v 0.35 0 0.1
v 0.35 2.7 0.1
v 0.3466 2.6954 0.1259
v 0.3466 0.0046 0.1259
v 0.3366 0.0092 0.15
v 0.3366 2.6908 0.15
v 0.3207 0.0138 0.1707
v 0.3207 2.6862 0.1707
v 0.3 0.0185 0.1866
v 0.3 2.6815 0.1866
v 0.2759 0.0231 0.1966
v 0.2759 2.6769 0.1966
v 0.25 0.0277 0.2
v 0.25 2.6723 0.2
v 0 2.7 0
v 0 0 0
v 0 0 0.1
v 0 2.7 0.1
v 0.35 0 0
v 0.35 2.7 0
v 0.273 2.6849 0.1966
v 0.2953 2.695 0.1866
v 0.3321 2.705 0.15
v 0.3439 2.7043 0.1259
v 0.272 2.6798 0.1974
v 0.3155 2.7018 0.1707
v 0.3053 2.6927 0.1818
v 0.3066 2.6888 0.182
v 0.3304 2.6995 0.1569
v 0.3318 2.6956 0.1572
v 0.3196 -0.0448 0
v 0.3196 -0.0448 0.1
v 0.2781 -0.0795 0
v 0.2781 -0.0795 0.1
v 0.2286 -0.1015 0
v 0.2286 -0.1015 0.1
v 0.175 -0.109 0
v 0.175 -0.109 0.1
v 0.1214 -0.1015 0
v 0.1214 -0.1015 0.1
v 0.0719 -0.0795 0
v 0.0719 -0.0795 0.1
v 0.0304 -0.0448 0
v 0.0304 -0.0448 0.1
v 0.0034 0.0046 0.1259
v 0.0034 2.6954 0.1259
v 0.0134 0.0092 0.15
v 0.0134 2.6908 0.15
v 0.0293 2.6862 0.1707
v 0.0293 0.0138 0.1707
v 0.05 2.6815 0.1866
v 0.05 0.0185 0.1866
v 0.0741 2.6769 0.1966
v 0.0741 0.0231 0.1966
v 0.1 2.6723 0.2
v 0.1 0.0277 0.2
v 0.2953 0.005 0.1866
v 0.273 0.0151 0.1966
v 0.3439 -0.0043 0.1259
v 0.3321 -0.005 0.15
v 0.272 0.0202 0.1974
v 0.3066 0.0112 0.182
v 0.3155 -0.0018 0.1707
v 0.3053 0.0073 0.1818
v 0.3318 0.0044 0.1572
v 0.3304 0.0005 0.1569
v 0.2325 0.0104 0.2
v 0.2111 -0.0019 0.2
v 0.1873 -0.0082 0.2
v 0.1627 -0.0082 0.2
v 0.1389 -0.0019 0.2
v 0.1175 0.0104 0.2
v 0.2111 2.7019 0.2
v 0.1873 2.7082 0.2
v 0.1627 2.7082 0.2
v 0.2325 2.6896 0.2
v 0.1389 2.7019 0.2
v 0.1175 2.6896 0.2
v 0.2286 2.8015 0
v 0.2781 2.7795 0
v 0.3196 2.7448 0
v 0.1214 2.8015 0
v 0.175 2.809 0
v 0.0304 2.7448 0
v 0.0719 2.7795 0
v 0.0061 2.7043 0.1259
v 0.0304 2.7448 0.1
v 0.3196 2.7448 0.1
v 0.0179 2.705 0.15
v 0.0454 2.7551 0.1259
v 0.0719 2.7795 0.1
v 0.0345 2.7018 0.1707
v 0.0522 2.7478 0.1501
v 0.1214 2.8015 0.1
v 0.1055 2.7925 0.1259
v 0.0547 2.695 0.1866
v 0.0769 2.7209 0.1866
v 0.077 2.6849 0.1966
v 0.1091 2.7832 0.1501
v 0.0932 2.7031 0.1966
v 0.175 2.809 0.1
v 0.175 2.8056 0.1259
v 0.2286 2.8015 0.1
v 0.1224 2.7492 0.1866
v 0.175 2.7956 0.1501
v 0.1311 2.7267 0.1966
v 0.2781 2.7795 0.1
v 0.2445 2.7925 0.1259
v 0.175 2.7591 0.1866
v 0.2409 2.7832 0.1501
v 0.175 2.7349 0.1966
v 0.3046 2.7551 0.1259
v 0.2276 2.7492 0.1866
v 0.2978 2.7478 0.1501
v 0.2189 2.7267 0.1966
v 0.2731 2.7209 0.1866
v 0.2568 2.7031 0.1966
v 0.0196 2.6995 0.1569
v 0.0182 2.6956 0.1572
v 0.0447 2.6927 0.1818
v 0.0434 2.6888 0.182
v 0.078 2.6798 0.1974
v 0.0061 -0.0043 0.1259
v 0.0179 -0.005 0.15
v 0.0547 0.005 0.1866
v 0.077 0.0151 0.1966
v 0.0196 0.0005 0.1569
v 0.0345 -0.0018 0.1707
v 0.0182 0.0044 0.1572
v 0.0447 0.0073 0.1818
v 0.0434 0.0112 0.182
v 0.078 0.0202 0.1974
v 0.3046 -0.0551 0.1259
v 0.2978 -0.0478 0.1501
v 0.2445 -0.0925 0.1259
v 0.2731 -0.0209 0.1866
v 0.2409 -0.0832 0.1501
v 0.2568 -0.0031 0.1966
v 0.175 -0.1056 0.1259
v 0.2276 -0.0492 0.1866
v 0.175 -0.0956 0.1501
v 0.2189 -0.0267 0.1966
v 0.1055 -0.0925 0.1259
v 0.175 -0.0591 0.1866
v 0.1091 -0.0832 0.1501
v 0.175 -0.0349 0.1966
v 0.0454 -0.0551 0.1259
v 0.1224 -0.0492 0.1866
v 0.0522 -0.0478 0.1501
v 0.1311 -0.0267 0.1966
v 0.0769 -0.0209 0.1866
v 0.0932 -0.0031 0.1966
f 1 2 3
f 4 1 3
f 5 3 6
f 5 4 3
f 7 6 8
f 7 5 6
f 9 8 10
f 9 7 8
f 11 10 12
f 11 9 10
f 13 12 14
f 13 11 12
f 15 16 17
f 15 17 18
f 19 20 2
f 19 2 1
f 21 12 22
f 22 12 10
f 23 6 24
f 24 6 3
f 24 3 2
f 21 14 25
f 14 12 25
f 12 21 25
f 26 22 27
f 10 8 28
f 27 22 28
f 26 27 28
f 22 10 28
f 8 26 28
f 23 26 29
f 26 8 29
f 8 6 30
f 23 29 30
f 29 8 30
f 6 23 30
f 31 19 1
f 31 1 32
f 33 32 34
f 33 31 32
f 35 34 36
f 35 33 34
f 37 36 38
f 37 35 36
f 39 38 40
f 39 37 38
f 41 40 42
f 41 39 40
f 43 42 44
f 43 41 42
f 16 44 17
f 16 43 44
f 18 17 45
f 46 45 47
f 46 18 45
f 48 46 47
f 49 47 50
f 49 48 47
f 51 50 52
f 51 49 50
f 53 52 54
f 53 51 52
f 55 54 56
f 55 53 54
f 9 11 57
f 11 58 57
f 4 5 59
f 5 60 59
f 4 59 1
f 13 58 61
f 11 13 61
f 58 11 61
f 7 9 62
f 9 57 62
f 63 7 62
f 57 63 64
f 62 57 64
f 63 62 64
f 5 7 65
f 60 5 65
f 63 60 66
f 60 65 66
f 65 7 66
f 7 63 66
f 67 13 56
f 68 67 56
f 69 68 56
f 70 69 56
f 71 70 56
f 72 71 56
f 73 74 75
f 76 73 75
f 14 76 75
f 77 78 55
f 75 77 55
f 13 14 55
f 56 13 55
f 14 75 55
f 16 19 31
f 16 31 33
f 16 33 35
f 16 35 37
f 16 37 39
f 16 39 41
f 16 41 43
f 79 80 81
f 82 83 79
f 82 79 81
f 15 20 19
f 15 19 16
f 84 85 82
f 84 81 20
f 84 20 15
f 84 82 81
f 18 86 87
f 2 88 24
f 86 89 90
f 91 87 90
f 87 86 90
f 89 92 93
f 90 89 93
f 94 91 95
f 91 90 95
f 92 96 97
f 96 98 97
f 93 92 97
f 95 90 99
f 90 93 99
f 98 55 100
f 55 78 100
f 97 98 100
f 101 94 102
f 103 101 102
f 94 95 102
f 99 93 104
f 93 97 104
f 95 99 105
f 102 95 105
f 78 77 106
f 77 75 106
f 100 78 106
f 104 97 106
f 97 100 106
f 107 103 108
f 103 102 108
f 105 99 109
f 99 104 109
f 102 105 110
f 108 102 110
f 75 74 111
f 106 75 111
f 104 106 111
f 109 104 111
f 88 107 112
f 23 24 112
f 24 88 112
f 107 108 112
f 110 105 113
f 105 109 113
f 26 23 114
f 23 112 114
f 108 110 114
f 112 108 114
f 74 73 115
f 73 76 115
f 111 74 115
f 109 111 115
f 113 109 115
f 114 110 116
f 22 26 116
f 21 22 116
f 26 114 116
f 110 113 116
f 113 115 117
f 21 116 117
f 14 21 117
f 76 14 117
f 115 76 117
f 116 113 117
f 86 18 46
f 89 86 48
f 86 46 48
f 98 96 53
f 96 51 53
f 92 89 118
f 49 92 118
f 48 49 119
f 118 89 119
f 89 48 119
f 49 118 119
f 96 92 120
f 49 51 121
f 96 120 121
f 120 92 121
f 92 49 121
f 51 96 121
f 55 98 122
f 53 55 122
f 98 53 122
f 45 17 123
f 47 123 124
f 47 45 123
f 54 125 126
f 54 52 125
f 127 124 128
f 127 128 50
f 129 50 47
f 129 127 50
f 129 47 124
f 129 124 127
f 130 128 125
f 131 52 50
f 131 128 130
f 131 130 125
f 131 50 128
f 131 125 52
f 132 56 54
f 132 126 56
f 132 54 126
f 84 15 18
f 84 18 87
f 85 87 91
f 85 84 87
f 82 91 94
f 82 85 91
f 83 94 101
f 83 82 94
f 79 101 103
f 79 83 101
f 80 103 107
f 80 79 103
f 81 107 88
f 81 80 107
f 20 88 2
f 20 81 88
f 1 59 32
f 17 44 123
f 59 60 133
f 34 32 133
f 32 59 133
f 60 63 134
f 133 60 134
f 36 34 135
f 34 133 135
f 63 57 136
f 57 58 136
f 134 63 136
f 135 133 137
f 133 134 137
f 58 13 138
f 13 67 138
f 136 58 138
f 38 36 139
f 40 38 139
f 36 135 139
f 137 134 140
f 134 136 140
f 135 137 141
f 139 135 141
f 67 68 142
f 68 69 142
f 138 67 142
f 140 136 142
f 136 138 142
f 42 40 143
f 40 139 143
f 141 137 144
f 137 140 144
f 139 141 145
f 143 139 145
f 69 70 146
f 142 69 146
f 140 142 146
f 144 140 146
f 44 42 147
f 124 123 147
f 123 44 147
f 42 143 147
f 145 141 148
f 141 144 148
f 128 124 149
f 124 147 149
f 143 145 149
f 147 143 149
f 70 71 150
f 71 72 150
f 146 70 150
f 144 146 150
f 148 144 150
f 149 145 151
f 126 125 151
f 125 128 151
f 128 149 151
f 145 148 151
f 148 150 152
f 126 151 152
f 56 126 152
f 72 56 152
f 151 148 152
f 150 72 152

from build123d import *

# Parameters (mm, degrees)
BOSS_EXTRU_1_DEPTH = 0.2
CONG_1_R           = 0.1


with BuildPart() as part:
    # Esquisse1 → Boss.-Extru.1 (new body)
    with BuildSketch(Plane.XY):
        with BuildLine():
            Line((0, 0), (0, 2.7))
            ThreePointArc((0, 2.7), (0.175, 2.809006611), (0.35, 2.7))
            Line((0.35, 2.7), (0.35, 0))
            ThreePointArc((0.35, 0), (0.175, -0.109006611), (0, 0))
        make_face()
    extrude(amount=BOSS_EXTRU_1_DEPTH)

    # Congé1
    cong_1_edges = [part.edges().sort_by_distance(p)[0] for p in [
        (0.175, 2.809006611, 0.2),
        (0, 1.35, 0.2),
        (0.175, -0.109006611, 0.2),
        (0.35, 1.35, 0.2),
    ]]
    fillet(cong_1_edges, radius=CONG_1_R)


solid = part.part
